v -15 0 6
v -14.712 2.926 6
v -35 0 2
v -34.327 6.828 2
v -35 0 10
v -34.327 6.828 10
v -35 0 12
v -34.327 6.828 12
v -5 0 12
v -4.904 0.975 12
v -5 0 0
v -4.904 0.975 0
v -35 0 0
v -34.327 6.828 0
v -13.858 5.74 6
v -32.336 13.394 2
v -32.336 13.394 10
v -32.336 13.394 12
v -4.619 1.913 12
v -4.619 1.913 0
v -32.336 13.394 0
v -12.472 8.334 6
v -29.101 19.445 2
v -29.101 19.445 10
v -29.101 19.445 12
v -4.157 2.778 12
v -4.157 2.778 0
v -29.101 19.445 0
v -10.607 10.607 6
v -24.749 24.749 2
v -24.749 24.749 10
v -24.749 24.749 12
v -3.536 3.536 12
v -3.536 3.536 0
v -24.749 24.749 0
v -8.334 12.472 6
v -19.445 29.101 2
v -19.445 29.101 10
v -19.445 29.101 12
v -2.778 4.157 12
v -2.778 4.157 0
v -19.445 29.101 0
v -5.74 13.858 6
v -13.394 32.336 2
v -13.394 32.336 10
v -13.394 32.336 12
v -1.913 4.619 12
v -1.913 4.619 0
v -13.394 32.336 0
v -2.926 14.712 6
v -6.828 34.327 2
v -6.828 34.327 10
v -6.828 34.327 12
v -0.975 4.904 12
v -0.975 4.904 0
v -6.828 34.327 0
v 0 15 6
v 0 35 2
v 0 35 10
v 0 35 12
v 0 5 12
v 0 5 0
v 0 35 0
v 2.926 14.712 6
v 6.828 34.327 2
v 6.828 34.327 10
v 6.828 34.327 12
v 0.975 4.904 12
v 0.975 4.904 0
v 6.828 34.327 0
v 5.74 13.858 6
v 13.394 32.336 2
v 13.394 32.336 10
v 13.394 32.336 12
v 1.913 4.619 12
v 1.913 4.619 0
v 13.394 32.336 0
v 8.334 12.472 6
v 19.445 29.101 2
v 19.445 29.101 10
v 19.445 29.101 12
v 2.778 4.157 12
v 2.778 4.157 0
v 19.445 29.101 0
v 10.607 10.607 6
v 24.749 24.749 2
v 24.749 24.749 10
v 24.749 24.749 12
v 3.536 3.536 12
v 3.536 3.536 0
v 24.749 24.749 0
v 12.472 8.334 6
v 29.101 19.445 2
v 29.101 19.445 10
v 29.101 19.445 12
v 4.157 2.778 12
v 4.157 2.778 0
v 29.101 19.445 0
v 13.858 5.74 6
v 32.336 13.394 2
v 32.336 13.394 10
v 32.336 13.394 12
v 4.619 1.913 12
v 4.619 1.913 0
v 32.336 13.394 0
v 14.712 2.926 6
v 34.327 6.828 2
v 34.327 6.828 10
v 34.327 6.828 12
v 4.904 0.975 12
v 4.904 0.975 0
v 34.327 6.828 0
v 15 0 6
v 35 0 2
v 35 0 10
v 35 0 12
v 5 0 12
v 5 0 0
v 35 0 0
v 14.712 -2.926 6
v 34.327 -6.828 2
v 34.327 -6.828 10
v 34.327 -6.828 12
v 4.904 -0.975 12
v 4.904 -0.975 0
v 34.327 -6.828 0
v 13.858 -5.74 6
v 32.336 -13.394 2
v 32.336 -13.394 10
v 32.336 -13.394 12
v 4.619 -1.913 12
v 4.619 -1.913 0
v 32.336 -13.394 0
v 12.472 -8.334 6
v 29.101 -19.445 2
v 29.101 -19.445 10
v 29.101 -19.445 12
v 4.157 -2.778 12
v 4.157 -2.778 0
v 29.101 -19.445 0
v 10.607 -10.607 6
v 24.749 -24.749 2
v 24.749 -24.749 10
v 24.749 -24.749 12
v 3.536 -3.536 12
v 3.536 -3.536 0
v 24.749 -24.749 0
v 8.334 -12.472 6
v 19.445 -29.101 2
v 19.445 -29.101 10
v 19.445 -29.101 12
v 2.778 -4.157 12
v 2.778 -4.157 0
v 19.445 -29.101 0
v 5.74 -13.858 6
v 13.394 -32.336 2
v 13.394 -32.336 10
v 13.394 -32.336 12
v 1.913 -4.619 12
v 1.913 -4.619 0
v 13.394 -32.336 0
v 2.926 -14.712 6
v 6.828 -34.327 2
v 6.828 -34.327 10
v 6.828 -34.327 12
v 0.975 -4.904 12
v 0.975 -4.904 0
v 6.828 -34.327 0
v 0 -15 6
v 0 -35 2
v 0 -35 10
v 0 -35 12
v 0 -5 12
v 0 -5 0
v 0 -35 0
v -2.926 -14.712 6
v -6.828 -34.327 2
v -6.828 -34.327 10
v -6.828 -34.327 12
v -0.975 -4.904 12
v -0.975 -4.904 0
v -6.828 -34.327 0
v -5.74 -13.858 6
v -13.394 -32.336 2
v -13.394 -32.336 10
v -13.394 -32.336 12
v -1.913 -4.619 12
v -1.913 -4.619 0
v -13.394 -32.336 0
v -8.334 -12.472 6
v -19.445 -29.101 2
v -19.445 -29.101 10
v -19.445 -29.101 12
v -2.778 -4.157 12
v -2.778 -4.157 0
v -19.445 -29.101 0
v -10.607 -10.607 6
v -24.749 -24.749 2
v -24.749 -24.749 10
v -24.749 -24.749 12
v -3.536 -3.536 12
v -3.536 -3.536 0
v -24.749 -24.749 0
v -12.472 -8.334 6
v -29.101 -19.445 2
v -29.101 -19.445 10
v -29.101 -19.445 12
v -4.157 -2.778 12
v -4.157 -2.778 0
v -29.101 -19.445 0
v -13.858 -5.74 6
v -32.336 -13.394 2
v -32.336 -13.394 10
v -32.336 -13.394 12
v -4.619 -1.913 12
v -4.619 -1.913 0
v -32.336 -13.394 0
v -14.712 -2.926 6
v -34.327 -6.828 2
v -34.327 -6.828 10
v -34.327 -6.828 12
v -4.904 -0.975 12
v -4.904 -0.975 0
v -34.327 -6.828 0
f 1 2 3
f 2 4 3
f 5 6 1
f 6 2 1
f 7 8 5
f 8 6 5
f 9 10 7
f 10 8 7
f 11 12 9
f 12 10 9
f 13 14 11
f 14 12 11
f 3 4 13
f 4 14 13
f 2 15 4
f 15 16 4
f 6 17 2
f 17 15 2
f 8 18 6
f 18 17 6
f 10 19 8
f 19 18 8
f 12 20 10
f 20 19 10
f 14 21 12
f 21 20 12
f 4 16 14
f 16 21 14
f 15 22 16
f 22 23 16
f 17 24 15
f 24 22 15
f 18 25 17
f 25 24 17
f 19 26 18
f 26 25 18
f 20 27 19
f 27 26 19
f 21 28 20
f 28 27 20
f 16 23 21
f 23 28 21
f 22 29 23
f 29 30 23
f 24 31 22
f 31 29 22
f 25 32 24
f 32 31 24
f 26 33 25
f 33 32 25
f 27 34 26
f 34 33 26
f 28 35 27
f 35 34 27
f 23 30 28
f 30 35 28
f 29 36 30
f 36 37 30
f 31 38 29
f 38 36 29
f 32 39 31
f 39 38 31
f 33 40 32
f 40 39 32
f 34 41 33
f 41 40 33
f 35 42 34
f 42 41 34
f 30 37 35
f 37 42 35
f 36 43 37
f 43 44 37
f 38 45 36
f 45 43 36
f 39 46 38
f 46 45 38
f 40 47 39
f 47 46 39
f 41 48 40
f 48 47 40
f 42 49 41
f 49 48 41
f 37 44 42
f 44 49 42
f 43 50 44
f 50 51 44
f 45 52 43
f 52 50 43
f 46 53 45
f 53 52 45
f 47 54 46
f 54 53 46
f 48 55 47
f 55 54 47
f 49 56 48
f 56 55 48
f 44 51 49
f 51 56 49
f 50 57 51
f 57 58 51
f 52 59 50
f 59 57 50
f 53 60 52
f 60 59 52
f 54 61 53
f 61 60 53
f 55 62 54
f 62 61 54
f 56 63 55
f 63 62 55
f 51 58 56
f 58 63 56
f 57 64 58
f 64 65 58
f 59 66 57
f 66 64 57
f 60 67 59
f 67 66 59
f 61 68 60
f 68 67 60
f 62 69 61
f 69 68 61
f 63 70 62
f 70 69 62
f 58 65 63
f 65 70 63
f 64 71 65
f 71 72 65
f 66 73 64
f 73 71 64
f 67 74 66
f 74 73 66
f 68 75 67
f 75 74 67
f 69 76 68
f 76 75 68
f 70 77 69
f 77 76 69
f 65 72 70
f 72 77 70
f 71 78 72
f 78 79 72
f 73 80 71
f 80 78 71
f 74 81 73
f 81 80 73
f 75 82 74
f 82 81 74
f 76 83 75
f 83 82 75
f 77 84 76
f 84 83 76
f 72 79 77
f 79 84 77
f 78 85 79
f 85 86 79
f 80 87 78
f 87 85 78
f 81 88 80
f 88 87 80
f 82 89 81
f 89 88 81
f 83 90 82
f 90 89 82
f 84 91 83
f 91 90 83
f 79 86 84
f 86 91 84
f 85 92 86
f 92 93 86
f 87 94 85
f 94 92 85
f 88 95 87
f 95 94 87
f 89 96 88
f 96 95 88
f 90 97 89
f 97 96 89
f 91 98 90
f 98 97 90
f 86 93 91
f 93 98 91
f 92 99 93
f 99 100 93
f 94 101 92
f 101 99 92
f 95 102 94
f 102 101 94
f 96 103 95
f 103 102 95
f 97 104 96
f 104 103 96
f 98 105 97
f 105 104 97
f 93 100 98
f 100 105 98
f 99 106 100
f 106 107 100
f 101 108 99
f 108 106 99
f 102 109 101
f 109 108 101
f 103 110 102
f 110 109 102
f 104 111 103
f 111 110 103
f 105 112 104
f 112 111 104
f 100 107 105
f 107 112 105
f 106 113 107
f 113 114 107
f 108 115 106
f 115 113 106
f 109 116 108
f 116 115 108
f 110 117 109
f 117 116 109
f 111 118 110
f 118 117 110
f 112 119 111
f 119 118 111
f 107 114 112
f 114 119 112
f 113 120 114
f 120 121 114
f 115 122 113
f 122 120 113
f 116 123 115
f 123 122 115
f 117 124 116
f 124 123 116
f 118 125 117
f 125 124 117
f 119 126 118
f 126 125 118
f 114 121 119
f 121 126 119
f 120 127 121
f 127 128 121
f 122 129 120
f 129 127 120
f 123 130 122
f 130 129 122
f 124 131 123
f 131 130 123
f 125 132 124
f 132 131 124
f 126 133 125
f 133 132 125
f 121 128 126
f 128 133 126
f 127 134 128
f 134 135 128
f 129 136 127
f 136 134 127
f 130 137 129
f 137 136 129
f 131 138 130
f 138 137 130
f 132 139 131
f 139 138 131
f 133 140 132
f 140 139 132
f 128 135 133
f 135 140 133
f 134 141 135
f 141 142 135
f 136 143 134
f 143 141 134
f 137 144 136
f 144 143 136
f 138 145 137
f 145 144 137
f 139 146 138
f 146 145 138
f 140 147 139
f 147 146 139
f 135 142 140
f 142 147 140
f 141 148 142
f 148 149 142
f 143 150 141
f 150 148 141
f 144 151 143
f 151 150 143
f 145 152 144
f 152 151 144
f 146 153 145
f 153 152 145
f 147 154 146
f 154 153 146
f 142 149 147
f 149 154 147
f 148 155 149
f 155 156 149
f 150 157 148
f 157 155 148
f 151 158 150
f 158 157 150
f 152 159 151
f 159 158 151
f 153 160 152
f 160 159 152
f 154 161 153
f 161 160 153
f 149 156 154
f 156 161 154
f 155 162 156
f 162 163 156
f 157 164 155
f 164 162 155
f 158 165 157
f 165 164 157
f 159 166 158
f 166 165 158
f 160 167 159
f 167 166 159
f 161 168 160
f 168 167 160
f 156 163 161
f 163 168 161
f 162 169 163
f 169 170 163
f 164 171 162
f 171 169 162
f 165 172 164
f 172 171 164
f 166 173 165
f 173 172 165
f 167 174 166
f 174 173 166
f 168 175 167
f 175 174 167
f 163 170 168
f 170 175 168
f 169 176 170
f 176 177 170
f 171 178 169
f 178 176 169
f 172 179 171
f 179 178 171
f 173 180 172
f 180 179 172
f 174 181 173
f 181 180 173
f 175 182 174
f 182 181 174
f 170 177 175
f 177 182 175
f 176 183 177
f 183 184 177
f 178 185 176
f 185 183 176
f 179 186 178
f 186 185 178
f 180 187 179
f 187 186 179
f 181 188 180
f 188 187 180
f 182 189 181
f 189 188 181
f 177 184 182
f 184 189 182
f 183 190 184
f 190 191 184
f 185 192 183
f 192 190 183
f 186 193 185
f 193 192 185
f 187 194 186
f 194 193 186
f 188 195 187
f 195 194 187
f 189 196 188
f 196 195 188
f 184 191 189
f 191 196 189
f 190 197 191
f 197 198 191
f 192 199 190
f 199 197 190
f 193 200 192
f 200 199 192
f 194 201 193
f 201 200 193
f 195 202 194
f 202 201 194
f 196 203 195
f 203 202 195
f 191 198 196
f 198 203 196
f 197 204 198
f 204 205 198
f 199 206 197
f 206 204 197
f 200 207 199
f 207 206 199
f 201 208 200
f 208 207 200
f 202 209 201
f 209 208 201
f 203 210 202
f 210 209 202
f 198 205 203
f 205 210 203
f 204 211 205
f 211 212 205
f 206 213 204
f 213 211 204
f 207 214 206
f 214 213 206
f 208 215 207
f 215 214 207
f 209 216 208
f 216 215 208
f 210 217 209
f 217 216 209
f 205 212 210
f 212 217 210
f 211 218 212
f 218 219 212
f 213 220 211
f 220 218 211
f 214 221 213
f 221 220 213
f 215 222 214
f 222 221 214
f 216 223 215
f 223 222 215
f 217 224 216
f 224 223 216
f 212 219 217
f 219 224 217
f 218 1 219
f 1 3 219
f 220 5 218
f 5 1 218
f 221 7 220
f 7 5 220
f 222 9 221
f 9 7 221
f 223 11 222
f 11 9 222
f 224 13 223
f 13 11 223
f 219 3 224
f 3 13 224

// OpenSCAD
$fn = 32;

// ----------------------------------------------------------------------
// Revolved part: V-groove pulley R35
// ----------------------------------------------------------------------

// --- parameters (mm) ---
bore_r = 5;               // bore radius
rim_r = 35;               // rim radius
rim_t = 12;               // rim width
groove_r = 15;            // groove root radius
groove_w = 4;             // groove half width
revolve_angle = 360;      // revolve sweep, degrees

bore_d = 2 * bore_r;
rim_d = 2 * rim_r;
groove_d = 2 * groove_r;

profile = [[5, 0], [35, 0], [35, 2], [15, 6], [35, 10], [35, 12], [5, 12]];  // primary outline, 7 points, counter clockwise

// --- the one profile operation ---
rotate_extrude(angle = revolve_angle) polygon(points = profile);
